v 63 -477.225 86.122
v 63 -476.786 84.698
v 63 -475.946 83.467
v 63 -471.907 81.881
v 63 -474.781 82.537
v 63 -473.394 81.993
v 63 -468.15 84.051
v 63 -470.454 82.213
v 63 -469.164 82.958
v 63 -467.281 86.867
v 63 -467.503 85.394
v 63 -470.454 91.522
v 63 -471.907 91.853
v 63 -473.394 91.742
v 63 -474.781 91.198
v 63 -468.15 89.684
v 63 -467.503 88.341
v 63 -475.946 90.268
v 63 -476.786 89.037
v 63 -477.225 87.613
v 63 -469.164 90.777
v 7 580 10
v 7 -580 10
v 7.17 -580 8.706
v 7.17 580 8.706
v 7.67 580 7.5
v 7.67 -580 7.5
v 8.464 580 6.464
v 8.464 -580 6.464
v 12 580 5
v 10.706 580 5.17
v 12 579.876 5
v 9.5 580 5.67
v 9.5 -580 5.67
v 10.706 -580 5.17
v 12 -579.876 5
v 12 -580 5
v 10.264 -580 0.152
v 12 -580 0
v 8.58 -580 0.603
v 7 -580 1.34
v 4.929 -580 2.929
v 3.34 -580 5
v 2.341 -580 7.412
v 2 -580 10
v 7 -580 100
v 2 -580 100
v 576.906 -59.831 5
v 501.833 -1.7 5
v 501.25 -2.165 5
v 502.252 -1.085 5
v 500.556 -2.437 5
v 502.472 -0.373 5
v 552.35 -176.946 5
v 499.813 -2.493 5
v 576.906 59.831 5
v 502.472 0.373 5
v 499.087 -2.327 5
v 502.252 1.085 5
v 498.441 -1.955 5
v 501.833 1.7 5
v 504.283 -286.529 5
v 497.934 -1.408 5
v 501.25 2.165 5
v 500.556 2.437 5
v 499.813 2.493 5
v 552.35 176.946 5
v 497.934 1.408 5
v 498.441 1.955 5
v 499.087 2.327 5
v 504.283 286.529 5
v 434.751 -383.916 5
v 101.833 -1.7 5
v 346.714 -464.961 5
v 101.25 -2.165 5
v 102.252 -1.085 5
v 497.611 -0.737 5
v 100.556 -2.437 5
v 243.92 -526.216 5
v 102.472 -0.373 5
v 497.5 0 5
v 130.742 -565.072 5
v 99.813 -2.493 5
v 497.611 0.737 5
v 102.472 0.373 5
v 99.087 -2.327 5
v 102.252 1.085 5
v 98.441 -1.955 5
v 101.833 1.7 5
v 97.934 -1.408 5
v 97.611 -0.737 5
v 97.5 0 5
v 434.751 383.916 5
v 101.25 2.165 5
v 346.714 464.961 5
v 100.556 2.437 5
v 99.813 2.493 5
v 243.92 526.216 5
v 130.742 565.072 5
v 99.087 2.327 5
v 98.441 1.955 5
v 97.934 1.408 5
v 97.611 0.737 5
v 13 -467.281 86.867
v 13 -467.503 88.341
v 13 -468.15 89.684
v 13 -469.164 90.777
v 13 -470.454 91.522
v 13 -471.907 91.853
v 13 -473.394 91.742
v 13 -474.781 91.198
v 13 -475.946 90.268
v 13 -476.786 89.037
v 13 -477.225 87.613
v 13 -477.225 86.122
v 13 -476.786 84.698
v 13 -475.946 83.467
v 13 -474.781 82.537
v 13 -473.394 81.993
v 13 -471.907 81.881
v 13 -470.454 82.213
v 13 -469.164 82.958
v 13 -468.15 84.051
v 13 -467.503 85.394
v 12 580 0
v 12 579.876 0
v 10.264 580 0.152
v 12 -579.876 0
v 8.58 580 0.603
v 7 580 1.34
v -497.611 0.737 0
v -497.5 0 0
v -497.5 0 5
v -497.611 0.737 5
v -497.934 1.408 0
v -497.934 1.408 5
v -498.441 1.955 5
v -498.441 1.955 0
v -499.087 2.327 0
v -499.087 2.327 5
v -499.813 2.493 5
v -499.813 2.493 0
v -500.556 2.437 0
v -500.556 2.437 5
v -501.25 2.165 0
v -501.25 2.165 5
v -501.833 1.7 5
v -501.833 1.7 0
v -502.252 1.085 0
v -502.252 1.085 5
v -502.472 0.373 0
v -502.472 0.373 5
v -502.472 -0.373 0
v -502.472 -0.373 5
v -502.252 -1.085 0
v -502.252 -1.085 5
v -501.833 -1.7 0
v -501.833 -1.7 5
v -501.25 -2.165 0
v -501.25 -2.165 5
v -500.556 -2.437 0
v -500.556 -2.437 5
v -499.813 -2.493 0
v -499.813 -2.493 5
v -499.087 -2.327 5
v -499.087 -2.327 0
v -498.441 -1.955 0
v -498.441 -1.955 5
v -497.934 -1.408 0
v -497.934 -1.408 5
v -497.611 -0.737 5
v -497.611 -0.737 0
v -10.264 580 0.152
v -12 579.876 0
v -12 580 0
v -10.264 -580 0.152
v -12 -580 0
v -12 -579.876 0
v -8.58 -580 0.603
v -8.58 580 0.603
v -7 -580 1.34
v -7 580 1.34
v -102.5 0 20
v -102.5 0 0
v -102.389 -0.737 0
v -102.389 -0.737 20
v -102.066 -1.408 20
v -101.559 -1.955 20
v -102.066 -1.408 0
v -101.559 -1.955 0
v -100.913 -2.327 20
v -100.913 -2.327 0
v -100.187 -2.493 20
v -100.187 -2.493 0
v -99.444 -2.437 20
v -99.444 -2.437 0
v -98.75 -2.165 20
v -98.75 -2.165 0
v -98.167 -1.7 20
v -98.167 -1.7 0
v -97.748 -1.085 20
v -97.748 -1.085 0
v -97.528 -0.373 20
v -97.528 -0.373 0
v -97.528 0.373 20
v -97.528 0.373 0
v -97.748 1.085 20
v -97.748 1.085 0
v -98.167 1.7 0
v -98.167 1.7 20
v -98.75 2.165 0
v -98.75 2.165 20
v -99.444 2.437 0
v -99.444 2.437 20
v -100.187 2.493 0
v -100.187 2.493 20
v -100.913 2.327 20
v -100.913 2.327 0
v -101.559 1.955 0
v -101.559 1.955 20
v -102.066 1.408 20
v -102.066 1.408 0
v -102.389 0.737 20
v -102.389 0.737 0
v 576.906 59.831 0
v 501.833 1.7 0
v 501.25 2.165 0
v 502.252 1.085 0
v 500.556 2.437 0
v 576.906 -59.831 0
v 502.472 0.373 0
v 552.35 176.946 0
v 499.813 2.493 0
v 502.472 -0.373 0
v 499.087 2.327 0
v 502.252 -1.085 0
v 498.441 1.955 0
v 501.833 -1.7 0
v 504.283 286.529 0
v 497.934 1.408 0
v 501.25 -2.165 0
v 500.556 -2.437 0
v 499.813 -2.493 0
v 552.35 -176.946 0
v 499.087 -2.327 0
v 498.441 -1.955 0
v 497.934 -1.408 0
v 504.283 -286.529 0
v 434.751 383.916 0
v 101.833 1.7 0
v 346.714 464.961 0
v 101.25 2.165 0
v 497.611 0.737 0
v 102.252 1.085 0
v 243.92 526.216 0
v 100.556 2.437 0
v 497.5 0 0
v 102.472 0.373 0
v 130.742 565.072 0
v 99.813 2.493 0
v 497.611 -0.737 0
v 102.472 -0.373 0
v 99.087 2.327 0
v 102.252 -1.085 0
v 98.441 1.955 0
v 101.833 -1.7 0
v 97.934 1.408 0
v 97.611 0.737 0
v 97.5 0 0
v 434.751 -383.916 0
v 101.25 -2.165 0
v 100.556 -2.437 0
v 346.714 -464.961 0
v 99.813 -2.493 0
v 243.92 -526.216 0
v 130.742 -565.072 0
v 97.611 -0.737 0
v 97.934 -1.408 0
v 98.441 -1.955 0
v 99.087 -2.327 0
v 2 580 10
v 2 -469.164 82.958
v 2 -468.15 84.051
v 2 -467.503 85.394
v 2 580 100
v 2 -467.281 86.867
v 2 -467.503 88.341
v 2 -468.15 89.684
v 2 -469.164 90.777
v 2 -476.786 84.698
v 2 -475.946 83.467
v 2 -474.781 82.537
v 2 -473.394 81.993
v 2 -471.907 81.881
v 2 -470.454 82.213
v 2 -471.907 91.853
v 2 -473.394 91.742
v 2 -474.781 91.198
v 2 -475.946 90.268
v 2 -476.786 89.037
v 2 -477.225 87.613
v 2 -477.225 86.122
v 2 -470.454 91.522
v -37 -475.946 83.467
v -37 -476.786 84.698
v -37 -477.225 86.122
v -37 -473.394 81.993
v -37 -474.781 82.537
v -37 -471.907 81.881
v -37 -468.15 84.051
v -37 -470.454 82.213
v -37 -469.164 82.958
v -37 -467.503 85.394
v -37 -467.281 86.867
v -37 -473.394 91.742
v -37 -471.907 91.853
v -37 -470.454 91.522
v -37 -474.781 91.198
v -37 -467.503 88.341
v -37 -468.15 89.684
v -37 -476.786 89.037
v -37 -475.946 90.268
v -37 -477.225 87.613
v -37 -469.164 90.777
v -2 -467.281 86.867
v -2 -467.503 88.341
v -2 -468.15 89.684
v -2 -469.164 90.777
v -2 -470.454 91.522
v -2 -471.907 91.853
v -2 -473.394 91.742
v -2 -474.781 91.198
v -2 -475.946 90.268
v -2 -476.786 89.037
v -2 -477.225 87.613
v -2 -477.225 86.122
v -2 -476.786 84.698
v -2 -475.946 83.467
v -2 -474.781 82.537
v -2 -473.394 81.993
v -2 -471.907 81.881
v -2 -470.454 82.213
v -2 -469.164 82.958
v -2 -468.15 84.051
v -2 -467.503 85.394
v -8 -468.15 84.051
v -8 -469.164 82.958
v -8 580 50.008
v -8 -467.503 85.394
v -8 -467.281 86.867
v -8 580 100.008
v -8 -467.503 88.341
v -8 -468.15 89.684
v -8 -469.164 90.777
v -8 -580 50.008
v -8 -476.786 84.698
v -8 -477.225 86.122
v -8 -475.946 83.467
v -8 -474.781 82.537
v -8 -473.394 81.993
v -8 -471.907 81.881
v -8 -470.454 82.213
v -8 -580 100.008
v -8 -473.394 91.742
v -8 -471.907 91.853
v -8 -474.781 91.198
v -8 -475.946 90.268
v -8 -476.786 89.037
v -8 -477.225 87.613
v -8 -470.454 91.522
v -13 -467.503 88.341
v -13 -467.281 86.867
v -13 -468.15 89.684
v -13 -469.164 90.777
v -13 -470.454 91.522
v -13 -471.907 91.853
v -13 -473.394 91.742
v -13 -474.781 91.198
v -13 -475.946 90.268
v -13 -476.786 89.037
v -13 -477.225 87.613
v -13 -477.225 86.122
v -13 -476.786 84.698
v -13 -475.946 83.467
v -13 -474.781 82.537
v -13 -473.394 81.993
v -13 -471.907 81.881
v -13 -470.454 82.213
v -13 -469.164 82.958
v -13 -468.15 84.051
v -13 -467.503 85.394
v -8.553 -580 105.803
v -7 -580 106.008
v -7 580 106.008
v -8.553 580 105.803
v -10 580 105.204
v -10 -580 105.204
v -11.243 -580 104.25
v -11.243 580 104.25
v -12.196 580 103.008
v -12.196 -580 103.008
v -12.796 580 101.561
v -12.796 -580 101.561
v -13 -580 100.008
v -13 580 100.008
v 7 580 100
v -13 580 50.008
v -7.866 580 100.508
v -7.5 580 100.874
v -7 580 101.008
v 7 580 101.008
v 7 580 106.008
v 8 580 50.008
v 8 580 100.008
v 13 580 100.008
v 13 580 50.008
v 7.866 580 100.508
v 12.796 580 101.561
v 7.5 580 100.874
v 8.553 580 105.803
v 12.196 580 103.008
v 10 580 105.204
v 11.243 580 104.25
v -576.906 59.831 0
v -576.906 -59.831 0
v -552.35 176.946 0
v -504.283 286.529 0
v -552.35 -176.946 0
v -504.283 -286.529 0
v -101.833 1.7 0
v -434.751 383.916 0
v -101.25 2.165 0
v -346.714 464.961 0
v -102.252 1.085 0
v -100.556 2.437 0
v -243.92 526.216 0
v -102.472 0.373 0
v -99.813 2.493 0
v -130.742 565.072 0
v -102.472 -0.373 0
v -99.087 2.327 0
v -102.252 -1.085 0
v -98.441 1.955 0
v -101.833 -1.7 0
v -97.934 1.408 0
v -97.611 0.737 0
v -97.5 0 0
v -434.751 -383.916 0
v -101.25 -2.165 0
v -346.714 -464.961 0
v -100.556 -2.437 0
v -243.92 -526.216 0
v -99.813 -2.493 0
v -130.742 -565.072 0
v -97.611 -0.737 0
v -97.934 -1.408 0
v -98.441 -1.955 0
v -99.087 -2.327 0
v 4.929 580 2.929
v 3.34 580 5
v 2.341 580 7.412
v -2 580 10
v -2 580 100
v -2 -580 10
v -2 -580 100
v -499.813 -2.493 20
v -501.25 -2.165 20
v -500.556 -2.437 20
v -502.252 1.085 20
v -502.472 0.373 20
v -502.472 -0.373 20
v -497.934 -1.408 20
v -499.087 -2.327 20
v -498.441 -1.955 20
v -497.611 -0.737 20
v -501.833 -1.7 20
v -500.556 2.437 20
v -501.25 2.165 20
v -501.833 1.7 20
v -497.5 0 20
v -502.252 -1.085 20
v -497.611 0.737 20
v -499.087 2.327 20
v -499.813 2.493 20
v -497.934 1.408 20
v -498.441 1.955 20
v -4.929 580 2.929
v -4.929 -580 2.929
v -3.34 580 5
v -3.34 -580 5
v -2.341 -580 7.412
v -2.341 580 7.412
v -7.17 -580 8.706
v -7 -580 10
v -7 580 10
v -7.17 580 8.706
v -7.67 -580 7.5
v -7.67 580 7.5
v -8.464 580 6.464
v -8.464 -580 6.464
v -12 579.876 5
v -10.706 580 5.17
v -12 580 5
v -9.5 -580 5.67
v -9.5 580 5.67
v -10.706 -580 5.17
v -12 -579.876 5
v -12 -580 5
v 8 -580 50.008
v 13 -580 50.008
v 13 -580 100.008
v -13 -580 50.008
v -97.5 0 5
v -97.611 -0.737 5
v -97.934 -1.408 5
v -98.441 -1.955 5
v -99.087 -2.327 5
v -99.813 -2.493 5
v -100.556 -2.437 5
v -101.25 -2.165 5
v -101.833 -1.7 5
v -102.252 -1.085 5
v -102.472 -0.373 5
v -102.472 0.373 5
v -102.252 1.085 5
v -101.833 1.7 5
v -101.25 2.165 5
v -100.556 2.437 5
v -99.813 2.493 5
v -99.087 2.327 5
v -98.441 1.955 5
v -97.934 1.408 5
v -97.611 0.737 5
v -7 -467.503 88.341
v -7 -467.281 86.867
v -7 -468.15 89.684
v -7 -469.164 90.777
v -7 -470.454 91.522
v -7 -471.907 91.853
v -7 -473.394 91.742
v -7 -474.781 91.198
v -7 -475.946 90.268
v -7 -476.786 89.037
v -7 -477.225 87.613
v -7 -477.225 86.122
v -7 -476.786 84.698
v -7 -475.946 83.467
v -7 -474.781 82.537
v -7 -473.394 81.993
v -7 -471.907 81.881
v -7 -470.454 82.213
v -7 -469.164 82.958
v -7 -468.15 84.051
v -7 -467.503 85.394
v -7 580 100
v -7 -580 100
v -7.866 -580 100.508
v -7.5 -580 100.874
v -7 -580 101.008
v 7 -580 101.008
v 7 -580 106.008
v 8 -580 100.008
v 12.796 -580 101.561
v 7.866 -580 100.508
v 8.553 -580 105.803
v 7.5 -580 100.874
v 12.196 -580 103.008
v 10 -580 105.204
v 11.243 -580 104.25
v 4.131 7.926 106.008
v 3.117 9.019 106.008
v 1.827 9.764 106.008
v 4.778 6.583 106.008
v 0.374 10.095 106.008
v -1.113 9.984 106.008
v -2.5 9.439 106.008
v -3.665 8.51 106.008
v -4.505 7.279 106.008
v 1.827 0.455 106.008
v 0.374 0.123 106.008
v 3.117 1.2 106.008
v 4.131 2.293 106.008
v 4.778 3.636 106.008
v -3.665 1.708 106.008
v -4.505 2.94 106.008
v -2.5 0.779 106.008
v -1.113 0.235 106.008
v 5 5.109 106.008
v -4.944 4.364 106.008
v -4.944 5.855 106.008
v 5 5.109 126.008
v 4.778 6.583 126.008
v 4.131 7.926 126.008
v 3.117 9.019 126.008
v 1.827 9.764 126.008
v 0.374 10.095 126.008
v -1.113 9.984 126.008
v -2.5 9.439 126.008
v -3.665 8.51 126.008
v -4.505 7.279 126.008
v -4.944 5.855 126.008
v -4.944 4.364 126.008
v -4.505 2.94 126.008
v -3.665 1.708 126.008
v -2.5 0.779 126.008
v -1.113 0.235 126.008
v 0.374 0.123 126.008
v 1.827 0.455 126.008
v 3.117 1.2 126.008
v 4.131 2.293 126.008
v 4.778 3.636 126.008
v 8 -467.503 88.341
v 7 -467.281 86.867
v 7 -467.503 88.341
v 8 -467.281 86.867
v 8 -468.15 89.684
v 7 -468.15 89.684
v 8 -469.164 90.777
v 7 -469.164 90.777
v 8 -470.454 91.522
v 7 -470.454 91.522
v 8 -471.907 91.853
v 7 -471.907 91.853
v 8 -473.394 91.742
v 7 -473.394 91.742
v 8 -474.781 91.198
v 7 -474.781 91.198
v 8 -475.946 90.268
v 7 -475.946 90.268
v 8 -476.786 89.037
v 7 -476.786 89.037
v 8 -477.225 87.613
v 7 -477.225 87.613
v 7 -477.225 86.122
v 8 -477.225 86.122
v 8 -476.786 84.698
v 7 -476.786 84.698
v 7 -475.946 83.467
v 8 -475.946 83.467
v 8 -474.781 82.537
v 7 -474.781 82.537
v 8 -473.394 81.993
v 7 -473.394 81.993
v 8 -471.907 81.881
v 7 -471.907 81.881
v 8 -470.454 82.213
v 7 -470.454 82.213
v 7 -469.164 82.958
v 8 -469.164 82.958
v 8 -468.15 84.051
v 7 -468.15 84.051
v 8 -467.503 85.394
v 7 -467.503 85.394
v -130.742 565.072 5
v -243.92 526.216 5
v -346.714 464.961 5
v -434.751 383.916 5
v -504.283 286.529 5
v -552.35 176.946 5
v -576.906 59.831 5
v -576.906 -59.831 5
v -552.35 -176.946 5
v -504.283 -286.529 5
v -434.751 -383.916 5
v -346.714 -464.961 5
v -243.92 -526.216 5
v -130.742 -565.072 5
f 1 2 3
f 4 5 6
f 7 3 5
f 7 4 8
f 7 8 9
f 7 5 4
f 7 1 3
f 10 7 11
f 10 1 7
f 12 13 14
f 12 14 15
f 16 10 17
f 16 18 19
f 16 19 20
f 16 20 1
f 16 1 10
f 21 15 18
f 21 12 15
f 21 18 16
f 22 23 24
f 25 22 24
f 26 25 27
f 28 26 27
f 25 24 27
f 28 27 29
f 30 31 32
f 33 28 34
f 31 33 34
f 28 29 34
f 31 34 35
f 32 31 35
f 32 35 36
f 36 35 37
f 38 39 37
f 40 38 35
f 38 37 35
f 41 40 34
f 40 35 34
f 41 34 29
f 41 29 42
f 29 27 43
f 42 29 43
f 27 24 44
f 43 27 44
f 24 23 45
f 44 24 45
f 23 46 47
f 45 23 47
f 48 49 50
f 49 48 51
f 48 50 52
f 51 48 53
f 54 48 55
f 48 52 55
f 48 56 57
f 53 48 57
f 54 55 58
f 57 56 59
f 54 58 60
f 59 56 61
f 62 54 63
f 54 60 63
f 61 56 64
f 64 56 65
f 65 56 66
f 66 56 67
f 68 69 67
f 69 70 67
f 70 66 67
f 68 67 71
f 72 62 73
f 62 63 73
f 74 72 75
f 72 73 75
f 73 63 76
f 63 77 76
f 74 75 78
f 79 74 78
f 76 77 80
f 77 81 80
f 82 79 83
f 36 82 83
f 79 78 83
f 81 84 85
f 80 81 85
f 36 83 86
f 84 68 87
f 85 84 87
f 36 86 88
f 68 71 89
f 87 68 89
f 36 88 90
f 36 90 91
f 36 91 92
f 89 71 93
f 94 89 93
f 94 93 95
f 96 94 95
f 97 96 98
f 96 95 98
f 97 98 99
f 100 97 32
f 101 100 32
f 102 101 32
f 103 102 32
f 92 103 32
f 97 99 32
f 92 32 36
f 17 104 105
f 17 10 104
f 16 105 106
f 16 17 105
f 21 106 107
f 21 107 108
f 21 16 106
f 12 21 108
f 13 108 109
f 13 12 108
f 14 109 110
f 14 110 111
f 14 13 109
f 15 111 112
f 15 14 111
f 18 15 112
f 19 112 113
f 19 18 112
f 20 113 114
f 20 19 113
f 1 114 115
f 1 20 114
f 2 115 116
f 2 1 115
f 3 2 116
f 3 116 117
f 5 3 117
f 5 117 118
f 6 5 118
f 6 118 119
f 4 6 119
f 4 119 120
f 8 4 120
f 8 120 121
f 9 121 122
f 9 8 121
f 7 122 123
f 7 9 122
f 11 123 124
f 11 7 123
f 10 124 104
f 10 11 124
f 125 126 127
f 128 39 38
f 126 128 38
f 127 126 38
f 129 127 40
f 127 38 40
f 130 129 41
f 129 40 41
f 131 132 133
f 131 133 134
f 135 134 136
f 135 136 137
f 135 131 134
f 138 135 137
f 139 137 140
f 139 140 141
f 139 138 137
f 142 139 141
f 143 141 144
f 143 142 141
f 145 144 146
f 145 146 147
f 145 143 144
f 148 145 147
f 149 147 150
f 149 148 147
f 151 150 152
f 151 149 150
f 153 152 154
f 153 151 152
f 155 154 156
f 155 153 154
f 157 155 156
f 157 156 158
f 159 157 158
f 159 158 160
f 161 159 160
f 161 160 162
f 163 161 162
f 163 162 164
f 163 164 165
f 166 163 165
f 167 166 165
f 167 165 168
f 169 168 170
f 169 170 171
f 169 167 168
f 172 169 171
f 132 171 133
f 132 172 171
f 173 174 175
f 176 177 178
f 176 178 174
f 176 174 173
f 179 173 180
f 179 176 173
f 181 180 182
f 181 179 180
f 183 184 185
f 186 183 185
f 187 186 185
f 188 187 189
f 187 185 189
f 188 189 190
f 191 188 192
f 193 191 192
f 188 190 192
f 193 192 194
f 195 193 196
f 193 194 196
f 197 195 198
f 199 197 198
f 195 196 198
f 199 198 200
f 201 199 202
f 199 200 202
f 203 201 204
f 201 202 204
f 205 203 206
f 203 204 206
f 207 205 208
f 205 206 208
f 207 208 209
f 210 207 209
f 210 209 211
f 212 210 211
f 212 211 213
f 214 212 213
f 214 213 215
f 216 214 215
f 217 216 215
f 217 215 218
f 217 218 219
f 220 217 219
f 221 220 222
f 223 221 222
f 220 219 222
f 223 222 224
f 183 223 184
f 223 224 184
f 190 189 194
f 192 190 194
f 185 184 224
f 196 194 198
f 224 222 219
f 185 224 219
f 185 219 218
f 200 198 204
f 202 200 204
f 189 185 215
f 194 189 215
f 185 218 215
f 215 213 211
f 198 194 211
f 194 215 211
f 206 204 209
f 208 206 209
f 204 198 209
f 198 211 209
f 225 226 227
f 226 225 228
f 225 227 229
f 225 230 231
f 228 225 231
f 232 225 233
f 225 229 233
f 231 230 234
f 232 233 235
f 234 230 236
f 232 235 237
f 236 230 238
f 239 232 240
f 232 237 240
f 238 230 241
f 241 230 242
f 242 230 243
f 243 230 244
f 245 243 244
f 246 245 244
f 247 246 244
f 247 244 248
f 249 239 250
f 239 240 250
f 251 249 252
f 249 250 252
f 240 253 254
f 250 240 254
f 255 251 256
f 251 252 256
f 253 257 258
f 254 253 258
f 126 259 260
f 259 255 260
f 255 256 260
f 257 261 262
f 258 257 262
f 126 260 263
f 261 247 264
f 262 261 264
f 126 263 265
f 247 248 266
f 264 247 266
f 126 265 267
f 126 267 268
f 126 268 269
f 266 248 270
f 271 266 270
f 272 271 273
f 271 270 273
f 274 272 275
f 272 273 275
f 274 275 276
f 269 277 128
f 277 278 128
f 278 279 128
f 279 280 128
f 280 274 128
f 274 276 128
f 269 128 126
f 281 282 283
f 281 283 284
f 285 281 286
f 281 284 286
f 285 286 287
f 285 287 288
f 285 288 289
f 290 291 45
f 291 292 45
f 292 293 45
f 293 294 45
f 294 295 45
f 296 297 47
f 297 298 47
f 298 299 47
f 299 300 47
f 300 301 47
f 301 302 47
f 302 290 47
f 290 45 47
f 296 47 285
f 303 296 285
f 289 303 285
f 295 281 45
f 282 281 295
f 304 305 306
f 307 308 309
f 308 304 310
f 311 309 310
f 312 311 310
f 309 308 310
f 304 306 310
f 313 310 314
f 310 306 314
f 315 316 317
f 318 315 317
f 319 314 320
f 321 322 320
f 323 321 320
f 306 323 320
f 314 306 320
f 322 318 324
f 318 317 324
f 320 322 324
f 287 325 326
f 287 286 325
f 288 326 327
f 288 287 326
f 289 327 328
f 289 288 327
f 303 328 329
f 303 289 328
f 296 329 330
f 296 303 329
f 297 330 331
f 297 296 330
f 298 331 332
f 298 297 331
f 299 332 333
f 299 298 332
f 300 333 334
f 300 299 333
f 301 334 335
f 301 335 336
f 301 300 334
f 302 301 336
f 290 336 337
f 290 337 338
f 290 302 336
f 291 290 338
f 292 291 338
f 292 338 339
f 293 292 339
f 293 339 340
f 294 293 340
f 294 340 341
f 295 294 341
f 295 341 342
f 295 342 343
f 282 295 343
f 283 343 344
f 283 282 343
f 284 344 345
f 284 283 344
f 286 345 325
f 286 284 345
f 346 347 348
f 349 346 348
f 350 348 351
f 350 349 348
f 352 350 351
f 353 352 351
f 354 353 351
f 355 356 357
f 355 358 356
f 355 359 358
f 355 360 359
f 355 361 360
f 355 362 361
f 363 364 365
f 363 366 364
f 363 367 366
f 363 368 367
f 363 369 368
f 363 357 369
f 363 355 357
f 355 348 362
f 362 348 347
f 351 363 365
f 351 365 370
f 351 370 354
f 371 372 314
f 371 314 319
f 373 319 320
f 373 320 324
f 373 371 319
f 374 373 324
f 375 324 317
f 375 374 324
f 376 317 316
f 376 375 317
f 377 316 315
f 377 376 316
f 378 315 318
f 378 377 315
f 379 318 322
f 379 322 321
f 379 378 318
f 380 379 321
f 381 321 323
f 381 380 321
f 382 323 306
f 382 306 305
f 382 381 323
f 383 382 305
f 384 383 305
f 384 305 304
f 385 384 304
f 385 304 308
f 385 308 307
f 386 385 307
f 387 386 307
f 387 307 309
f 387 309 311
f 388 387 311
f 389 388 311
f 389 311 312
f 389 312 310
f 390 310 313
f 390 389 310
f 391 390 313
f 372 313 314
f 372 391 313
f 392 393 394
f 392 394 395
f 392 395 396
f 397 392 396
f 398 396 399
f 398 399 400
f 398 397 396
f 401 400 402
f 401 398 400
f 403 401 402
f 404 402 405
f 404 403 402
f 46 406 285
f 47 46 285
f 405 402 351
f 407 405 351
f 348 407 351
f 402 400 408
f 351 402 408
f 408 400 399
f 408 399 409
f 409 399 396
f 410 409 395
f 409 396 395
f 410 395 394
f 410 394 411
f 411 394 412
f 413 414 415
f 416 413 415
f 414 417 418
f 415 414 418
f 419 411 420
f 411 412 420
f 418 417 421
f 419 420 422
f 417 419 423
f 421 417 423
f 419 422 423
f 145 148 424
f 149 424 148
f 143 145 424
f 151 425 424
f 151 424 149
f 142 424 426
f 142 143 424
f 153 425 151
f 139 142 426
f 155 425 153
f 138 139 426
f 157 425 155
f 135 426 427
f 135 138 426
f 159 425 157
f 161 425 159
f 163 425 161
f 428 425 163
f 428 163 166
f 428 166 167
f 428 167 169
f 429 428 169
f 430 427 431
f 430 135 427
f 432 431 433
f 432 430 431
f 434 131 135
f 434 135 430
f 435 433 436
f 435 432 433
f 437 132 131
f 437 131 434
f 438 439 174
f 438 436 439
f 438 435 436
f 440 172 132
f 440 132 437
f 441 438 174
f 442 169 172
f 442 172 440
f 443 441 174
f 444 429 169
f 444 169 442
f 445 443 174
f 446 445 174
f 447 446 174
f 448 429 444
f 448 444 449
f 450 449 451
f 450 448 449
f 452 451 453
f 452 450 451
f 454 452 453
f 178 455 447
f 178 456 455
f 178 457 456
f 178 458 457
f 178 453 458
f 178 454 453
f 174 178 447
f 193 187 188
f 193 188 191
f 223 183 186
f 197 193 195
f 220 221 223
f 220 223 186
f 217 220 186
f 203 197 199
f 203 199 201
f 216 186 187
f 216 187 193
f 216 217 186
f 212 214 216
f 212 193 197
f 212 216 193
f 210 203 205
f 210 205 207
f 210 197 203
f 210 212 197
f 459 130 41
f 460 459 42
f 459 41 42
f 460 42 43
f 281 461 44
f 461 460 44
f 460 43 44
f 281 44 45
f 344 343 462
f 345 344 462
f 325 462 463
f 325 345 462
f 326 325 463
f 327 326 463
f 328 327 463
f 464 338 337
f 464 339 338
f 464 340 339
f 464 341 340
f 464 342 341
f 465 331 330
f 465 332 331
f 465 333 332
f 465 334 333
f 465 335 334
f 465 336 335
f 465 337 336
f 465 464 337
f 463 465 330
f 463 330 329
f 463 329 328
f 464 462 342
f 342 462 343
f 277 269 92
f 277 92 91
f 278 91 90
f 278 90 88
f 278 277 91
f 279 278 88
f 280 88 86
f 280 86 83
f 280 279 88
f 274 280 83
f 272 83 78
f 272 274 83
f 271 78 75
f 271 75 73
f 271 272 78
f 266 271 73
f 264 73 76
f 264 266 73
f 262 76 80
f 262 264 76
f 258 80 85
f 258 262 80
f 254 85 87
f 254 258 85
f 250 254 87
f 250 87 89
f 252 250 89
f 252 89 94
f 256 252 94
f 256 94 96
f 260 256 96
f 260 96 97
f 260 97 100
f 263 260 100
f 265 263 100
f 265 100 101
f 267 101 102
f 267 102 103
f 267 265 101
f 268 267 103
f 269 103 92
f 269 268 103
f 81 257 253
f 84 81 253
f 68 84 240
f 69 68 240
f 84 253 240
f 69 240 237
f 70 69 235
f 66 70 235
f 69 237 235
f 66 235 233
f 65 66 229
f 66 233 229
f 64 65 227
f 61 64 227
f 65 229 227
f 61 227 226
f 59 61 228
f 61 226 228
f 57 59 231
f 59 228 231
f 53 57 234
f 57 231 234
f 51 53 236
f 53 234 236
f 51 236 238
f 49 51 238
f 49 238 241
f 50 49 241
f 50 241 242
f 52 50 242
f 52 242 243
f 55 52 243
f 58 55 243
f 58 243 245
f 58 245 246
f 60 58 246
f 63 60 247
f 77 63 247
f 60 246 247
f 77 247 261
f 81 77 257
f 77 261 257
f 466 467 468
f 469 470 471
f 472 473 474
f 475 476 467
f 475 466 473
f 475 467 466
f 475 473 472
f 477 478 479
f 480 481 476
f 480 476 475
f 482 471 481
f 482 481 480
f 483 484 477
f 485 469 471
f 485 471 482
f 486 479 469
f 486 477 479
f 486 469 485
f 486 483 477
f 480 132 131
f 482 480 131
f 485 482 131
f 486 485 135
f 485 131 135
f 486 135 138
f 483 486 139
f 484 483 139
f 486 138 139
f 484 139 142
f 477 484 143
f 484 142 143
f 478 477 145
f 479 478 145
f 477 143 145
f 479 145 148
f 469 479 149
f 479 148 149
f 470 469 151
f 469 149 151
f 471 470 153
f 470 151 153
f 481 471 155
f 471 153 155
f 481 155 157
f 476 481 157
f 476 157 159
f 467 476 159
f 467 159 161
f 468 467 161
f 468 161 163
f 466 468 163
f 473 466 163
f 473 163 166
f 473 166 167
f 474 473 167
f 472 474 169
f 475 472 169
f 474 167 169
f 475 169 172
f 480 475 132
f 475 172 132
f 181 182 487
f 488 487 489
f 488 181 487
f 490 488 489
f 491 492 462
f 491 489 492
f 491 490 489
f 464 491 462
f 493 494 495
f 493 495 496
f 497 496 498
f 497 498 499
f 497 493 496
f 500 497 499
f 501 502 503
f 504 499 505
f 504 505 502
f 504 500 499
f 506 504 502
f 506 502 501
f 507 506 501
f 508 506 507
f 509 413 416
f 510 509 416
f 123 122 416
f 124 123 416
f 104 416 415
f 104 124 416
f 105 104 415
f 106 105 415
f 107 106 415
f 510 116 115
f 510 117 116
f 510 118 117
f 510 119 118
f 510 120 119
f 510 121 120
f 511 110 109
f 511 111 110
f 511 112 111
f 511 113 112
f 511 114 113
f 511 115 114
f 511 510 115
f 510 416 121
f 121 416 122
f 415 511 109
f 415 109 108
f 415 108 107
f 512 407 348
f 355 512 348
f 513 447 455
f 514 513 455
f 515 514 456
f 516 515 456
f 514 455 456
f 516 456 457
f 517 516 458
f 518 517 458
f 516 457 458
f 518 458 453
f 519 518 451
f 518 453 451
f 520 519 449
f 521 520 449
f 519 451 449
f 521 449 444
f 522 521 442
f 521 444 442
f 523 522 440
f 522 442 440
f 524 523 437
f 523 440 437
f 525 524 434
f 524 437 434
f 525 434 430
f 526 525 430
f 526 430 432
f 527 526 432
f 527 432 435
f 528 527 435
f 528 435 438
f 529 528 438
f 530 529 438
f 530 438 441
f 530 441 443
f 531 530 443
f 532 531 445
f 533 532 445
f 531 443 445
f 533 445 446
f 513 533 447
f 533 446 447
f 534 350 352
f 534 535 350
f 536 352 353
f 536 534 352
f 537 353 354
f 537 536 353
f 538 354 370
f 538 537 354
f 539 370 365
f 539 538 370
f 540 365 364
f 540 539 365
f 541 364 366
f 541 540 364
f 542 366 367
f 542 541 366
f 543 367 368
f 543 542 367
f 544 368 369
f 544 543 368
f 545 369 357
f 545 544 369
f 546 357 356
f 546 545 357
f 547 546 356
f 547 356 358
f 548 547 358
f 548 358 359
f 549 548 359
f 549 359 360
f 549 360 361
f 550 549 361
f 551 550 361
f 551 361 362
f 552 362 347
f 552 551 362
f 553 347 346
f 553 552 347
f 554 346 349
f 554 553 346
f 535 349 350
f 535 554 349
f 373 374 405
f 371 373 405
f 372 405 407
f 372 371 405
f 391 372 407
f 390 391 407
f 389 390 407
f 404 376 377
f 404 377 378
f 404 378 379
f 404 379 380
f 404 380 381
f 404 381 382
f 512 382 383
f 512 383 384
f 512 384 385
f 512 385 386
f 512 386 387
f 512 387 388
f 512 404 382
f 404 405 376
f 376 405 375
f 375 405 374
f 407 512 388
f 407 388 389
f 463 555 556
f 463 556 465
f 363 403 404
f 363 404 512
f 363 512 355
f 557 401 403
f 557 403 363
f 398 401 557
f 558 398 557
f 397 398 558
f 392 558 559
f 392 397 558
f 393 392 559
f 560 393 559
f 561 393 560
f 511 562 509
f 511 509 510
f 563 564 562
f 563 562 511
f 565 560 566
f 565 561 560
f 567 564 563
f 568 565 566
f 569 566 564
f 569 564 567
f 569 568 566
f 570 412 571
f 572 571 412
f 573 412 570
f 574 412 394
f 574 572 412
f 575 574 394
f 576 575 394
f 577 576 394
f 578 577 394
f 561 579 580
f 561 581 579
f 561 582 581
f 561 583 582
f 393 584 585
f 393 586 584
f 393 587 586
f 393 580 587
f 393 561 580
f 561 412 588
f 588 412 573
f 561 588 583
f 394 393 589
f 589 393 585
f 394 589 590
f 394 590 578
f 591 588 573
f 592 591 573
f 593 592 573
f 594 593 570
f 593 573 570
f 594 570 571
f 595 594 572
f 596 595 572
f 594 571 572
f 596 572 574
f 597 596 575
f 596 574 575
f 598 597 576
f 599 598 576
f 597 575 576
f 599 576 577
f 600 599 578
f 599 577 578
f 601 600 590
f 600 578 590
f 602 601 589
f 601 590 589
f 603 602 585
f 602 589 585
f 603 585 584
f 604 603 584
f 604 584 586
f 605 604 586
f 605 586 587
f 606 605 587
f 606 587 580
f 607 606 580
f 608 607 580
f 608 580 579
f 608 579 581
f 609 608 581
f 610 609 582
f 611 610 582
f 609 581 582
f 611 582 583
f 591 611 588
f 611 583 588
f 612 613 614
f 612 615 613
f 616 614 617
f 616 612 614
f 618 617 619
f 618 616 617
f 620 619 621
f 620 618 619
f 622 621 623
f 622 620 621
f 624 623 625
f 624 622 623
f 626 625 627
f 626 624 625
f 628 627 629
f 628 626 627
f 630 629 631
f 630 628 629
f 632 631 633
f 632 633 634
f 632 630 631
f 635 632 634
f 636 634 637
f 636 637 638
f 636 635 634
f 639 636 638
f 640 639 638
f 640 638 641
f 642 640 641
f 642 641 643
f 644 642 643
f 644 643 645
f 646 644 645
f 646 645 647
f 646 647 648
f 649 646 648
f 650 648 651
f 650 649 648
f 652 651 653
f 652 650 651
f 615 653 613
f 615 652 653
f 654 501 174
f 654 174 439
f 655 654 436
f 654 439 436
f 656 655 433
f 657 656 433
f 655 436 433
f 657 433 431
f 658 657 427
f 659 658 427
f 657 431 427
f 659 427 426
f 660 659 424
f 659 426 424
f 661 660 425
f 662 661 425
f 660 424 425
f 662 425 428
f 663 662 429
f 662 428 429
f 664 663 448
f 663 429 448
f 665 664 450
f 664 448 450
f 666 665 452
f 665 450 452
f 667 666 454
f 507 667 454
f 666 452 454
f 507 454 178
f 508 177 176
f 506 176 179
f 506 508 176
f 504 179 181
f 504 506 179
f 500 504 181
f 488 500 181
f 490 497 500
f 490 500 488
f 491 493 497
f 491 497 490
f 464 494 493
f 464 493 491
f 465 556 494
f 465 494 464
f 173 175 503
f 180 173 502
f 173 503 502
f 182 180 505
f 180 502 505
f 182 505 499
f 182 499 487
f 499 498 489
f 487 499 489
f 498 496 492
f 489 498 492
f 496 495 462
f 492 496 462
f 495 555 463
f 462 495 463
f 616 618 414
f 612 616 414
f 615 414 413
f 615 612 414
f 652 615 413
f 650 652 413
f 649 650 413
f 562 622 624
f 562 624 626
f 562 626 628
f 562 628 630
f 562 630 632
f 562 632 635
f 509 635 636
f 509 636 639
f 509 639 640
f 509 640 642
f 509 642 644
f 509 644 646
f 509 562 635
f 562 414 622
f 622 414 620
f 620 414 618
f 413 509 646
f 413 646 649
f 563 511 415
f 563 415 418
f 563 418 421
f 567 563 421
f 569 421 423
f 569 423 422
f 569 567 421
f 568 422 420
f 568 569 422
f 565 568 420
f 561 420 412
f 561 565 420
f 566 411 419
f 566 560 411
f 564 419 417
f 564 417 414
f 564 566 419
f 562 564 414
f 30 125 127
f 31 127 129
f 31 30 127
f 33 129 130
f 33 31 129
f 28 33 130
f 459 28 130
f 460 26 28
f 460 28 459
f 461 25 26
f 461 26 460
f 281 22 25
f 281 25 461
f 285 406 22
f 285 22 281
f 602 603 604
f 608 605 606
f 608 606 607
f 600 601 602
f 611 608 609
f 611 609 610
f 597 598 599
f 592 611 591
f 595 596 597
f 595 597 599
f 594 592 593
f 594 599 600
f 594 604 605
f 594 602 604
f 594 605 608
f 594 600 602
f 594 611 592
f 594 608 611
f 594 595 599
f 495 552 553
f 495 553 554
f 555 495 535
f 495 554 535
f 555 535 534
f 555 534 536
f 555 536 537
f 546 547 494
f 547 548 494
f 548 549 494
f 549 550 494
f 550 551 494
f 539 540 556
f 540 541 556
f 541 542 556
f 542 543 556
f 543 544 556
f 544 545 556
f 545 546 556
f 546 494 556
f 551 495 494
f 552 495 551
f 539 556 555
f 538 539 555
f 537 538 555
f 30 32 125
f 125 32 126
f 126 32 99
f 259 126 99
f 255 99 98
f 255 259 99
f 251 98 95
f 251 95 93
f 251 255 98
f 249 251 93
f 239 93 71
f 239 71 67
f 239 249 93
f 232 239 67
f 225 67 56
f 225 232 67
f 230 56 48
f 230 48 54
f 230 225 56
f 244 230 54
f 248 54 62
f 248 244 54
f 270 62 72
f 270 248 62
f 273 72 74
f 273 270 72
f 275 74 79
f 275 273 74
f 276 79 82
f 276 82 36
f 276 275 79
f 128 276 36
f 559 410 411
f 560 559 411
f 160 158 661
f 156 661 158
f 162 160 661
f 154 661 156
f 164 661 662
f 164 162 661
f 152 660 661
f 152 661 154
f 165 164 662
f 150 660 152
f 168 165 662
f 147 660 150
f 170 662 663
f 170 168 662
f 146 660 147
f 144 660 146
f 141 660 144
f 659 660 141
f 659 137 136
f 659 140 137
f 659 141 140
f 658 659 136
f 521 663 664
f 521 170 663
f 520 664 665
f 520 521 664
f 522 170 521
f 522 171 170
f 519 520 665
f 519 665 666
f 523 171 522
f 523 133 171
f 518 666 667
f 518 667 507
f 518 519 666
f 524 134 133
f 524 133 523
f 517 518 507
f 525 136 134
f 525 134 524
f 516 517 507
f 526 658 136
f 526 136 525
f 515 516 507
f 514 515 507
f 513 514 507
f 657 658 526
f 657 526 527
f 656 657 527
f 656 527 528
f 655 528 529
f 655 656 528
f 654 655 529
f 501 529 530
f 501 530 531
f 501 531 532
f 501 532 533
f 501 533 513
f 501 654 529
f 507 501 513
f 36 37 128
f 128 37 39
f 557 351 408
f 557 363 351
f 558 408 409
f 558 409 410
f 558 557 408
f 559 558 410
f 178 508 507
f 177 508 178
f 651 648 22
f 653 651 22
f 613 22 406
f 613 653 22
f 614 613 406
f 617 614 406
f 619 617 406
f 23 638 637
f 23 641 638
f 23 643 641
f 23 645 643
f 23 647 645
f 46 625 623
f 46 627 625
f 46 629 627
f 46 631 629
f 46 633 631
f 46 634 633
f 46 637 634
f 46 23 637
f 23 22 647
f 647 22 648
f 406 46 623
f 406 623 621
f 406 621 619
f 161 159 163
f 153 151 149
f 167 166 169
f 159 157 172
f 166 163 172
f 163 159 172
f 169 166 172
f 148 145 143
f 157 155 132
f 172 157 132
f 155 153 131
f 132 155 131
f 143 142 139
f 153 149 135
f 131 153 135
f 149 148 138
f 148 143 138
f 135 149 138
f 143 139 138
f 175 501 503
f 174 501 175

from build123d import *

# Parameters (mm, degrees)
F0_R      = 2.5
F1_DEPTH  = 5
F2_W      = 5
F2_H      = 90
F3_DEPTH  = 580
F1_FACE_W = 1160
F1_FACE_H = 5
F4_DEPTH  = 12
F5_DEPTH  = 580
F8_DEPTH  = 580
F9_DEPTH  = 20
F10_DEPTH = 20
F11_R     = 5
F12_DEPTH = 20
F13_R     = 5
F14_DEPTH = 50


with BuildPart() as f1:
    # F0 (on Top) → F1 (new body)
    with BuildSketch(Plane.XY):
        with Locations((-500, 0)):
            Circle(F0_R)
        with BuildLine():
            Line((0, 0), (0, 580))
            ThreePointArc((0, 580), (-580, 0), (0, -580))
            Line((0, -580), (0, 0))
        make_face()
        with Locations((-500, 0)):
            Circle(F0_R, mode=Mode.SUBTRACT)
        with BuildLine():
            ThreePointArc((-102.5, 0), (-100, 2.5), (-97.5, 0))
            ThreePointArc((-97.5, 0), (-100, -2.5), (-102.5, 0))
        make_face(mode=Mode.SUBTRACT)
    extrude(amount=F1_DEPTH)

    # F2 (on Front) → F3 (join, symmetric)
    with BuildSketch(Plane.XZ):
        with Locations((-4.5, 55)):
            Rectangle(F2_W, F2_H)
        with BuildLine():
            Line((-2, 10), (-7, 10))
            ThreePointArc((-7, 10), (-8.464466, 6.464466), (-12, 5))
            Line((-12, 5), (-12, 0))
            ThreePointArc((-12, 0), (-9.41181, 0.340742), (-7, 1.339746))
            ThreePointArc((-7, 1.339746), (-3.339746, 5), (-2, 10))
        make_face()
        with BuildLine():
            Line((-7, 0), (-7, 1.339746))
            ThreePointArc((-7, 1.339746), (-9.41181, 0.340742), (-12, 0))
            Line((-12, 0), (-7, 0))
        make_face()
    extrude(amount=F3_DEPTH, both=True)

    # F1_face (on face) → F4 (cut)
    with BuildSketch(Plane(origin=(0, 0, 2.5), x_dir=(0, 1, 0), z_dir=(1, 0, 0))):
        Rectangle(F1_FACE_W, F1_FACE_H)
    extrude(amount=-F4_DEPTH, mode=Mode.SUBTRACT)

    # F2 (on Front) → F5 (join, symmetric)
    with BuildSketch(Plane.XZ):
        with BuildLine():
            Line((-2, 10), (-7, 10))
            ThreePointArc((-7, 10), (-8.464466, 6.464466), (-12, 5))
            Line((-12, 5), (-12, 0))
            ThreePointArc((-12, 0), (-9.41181, 0.340742), (-7, 1.339746))
            ThreePointArc((-7, 1.339746), (-3.339746, 5), (-2, 10))
        make_face()
        with Locations((-4.5, 55)):
            Rectangle(F2_W, F2_H)
    extrude(amount=F5_DEPTH, both=True)



with BuildPart() as f6_1:
    # F6: instance of F1
    add(f1.part.mirror(Plane.YZ))


with BuildPart() as f8:
    # F7 (on Front) → F8 (new body, symmetric)
    with BuildSketch(Plane.XZ):
        with BuildLine():
            ThreePointArc((7, 101.007758), (7.707107, 100.714864), (8, 100.007758))
            Line((8, 100.007758), (8, 50.007758))
            Line((8, 50.007758), (13, 50.007758))
            Line((13, 50.007758), (13, 100.007758))
            ThreePointArc((13, 100.007758), (11.242641, 104.250398), (7, 106.007758))
            Line((7, 106.007758), (0, 106.007758))
            Line((0, 106.007758), (-7, 106.007758))
            ThreePointArc((-7, 106.007758), (-11.242641, 104.250398), (-13, 100.007758))
            Line((-13, 100.007758), (-13, 50.007758))
            Line((-13, 50.007758), (-8, 50.007758))
            Line((-8, 50.007758), (-8, 100.007758))
            ThreePointArc((-8, 100.007758), (-7.707107, 100.714864), (-7, 101.007758))
            Line((-7, 101.007758), (0, 101.007758))
            Line((0, 101.007758), (7, 101.007758))
        make_face()
    extrude(amount=F8_DEPTH, both=True)

    # F11 (on face) → F12 (join)
    with BuildSketch(Plane.XY.offset(106.007758)):
        with Locations((0, 5.109347)):
            Circle(F11_R)
    extrude(amount=F12_DEPTH)


with BuildPart() as f9:
    # F0 (on Top) → F9 (new body)
    with BuildSketch(Plane.XY):
        with Locations((-500, 0)):
            Circle(F0_R)
    extrude(amount=F9_DEPTH)


with BuildPart() as f10:
    # F0 (on Top) → F10 (new body)
    with BuildSketch(Plane.XY):
        with BuildLine():
            Line((-100, 0), (-97.5, 0))
            ThreePointArc((-97.5, 0), (-100, 2.5), (-102.5, 0))
            Line((-102.5, 0), (-100, 0))
        make_face()
        with BuildLine():
            ThreePointArc((-102.5, 0), (-100, -2.5), (-97.5, 0))
            Line((-97.5, 0), (-100, 0))
            Line((-100, 0), (-102.5, 0))
        make_face()
    extrude(amount=F10_DEPTH)


with BuildPart() as f1_1:
    add(f1.part)

    add(f6_1.part)  # F14 merges F6_1

    add(f8.part)  # F14 merges F8
    # F13 (on face) → F14 (join, symmetric)
    with BuildSketch(Plane.YZ.offset(13)):
        with Locations((-472.281009, 86.867474)):
            Circle(F13_R)
    extrude(amount=F14_DEPTH, both=True)


solid = Compound([f9.part, f10.part, f1_1.part])
